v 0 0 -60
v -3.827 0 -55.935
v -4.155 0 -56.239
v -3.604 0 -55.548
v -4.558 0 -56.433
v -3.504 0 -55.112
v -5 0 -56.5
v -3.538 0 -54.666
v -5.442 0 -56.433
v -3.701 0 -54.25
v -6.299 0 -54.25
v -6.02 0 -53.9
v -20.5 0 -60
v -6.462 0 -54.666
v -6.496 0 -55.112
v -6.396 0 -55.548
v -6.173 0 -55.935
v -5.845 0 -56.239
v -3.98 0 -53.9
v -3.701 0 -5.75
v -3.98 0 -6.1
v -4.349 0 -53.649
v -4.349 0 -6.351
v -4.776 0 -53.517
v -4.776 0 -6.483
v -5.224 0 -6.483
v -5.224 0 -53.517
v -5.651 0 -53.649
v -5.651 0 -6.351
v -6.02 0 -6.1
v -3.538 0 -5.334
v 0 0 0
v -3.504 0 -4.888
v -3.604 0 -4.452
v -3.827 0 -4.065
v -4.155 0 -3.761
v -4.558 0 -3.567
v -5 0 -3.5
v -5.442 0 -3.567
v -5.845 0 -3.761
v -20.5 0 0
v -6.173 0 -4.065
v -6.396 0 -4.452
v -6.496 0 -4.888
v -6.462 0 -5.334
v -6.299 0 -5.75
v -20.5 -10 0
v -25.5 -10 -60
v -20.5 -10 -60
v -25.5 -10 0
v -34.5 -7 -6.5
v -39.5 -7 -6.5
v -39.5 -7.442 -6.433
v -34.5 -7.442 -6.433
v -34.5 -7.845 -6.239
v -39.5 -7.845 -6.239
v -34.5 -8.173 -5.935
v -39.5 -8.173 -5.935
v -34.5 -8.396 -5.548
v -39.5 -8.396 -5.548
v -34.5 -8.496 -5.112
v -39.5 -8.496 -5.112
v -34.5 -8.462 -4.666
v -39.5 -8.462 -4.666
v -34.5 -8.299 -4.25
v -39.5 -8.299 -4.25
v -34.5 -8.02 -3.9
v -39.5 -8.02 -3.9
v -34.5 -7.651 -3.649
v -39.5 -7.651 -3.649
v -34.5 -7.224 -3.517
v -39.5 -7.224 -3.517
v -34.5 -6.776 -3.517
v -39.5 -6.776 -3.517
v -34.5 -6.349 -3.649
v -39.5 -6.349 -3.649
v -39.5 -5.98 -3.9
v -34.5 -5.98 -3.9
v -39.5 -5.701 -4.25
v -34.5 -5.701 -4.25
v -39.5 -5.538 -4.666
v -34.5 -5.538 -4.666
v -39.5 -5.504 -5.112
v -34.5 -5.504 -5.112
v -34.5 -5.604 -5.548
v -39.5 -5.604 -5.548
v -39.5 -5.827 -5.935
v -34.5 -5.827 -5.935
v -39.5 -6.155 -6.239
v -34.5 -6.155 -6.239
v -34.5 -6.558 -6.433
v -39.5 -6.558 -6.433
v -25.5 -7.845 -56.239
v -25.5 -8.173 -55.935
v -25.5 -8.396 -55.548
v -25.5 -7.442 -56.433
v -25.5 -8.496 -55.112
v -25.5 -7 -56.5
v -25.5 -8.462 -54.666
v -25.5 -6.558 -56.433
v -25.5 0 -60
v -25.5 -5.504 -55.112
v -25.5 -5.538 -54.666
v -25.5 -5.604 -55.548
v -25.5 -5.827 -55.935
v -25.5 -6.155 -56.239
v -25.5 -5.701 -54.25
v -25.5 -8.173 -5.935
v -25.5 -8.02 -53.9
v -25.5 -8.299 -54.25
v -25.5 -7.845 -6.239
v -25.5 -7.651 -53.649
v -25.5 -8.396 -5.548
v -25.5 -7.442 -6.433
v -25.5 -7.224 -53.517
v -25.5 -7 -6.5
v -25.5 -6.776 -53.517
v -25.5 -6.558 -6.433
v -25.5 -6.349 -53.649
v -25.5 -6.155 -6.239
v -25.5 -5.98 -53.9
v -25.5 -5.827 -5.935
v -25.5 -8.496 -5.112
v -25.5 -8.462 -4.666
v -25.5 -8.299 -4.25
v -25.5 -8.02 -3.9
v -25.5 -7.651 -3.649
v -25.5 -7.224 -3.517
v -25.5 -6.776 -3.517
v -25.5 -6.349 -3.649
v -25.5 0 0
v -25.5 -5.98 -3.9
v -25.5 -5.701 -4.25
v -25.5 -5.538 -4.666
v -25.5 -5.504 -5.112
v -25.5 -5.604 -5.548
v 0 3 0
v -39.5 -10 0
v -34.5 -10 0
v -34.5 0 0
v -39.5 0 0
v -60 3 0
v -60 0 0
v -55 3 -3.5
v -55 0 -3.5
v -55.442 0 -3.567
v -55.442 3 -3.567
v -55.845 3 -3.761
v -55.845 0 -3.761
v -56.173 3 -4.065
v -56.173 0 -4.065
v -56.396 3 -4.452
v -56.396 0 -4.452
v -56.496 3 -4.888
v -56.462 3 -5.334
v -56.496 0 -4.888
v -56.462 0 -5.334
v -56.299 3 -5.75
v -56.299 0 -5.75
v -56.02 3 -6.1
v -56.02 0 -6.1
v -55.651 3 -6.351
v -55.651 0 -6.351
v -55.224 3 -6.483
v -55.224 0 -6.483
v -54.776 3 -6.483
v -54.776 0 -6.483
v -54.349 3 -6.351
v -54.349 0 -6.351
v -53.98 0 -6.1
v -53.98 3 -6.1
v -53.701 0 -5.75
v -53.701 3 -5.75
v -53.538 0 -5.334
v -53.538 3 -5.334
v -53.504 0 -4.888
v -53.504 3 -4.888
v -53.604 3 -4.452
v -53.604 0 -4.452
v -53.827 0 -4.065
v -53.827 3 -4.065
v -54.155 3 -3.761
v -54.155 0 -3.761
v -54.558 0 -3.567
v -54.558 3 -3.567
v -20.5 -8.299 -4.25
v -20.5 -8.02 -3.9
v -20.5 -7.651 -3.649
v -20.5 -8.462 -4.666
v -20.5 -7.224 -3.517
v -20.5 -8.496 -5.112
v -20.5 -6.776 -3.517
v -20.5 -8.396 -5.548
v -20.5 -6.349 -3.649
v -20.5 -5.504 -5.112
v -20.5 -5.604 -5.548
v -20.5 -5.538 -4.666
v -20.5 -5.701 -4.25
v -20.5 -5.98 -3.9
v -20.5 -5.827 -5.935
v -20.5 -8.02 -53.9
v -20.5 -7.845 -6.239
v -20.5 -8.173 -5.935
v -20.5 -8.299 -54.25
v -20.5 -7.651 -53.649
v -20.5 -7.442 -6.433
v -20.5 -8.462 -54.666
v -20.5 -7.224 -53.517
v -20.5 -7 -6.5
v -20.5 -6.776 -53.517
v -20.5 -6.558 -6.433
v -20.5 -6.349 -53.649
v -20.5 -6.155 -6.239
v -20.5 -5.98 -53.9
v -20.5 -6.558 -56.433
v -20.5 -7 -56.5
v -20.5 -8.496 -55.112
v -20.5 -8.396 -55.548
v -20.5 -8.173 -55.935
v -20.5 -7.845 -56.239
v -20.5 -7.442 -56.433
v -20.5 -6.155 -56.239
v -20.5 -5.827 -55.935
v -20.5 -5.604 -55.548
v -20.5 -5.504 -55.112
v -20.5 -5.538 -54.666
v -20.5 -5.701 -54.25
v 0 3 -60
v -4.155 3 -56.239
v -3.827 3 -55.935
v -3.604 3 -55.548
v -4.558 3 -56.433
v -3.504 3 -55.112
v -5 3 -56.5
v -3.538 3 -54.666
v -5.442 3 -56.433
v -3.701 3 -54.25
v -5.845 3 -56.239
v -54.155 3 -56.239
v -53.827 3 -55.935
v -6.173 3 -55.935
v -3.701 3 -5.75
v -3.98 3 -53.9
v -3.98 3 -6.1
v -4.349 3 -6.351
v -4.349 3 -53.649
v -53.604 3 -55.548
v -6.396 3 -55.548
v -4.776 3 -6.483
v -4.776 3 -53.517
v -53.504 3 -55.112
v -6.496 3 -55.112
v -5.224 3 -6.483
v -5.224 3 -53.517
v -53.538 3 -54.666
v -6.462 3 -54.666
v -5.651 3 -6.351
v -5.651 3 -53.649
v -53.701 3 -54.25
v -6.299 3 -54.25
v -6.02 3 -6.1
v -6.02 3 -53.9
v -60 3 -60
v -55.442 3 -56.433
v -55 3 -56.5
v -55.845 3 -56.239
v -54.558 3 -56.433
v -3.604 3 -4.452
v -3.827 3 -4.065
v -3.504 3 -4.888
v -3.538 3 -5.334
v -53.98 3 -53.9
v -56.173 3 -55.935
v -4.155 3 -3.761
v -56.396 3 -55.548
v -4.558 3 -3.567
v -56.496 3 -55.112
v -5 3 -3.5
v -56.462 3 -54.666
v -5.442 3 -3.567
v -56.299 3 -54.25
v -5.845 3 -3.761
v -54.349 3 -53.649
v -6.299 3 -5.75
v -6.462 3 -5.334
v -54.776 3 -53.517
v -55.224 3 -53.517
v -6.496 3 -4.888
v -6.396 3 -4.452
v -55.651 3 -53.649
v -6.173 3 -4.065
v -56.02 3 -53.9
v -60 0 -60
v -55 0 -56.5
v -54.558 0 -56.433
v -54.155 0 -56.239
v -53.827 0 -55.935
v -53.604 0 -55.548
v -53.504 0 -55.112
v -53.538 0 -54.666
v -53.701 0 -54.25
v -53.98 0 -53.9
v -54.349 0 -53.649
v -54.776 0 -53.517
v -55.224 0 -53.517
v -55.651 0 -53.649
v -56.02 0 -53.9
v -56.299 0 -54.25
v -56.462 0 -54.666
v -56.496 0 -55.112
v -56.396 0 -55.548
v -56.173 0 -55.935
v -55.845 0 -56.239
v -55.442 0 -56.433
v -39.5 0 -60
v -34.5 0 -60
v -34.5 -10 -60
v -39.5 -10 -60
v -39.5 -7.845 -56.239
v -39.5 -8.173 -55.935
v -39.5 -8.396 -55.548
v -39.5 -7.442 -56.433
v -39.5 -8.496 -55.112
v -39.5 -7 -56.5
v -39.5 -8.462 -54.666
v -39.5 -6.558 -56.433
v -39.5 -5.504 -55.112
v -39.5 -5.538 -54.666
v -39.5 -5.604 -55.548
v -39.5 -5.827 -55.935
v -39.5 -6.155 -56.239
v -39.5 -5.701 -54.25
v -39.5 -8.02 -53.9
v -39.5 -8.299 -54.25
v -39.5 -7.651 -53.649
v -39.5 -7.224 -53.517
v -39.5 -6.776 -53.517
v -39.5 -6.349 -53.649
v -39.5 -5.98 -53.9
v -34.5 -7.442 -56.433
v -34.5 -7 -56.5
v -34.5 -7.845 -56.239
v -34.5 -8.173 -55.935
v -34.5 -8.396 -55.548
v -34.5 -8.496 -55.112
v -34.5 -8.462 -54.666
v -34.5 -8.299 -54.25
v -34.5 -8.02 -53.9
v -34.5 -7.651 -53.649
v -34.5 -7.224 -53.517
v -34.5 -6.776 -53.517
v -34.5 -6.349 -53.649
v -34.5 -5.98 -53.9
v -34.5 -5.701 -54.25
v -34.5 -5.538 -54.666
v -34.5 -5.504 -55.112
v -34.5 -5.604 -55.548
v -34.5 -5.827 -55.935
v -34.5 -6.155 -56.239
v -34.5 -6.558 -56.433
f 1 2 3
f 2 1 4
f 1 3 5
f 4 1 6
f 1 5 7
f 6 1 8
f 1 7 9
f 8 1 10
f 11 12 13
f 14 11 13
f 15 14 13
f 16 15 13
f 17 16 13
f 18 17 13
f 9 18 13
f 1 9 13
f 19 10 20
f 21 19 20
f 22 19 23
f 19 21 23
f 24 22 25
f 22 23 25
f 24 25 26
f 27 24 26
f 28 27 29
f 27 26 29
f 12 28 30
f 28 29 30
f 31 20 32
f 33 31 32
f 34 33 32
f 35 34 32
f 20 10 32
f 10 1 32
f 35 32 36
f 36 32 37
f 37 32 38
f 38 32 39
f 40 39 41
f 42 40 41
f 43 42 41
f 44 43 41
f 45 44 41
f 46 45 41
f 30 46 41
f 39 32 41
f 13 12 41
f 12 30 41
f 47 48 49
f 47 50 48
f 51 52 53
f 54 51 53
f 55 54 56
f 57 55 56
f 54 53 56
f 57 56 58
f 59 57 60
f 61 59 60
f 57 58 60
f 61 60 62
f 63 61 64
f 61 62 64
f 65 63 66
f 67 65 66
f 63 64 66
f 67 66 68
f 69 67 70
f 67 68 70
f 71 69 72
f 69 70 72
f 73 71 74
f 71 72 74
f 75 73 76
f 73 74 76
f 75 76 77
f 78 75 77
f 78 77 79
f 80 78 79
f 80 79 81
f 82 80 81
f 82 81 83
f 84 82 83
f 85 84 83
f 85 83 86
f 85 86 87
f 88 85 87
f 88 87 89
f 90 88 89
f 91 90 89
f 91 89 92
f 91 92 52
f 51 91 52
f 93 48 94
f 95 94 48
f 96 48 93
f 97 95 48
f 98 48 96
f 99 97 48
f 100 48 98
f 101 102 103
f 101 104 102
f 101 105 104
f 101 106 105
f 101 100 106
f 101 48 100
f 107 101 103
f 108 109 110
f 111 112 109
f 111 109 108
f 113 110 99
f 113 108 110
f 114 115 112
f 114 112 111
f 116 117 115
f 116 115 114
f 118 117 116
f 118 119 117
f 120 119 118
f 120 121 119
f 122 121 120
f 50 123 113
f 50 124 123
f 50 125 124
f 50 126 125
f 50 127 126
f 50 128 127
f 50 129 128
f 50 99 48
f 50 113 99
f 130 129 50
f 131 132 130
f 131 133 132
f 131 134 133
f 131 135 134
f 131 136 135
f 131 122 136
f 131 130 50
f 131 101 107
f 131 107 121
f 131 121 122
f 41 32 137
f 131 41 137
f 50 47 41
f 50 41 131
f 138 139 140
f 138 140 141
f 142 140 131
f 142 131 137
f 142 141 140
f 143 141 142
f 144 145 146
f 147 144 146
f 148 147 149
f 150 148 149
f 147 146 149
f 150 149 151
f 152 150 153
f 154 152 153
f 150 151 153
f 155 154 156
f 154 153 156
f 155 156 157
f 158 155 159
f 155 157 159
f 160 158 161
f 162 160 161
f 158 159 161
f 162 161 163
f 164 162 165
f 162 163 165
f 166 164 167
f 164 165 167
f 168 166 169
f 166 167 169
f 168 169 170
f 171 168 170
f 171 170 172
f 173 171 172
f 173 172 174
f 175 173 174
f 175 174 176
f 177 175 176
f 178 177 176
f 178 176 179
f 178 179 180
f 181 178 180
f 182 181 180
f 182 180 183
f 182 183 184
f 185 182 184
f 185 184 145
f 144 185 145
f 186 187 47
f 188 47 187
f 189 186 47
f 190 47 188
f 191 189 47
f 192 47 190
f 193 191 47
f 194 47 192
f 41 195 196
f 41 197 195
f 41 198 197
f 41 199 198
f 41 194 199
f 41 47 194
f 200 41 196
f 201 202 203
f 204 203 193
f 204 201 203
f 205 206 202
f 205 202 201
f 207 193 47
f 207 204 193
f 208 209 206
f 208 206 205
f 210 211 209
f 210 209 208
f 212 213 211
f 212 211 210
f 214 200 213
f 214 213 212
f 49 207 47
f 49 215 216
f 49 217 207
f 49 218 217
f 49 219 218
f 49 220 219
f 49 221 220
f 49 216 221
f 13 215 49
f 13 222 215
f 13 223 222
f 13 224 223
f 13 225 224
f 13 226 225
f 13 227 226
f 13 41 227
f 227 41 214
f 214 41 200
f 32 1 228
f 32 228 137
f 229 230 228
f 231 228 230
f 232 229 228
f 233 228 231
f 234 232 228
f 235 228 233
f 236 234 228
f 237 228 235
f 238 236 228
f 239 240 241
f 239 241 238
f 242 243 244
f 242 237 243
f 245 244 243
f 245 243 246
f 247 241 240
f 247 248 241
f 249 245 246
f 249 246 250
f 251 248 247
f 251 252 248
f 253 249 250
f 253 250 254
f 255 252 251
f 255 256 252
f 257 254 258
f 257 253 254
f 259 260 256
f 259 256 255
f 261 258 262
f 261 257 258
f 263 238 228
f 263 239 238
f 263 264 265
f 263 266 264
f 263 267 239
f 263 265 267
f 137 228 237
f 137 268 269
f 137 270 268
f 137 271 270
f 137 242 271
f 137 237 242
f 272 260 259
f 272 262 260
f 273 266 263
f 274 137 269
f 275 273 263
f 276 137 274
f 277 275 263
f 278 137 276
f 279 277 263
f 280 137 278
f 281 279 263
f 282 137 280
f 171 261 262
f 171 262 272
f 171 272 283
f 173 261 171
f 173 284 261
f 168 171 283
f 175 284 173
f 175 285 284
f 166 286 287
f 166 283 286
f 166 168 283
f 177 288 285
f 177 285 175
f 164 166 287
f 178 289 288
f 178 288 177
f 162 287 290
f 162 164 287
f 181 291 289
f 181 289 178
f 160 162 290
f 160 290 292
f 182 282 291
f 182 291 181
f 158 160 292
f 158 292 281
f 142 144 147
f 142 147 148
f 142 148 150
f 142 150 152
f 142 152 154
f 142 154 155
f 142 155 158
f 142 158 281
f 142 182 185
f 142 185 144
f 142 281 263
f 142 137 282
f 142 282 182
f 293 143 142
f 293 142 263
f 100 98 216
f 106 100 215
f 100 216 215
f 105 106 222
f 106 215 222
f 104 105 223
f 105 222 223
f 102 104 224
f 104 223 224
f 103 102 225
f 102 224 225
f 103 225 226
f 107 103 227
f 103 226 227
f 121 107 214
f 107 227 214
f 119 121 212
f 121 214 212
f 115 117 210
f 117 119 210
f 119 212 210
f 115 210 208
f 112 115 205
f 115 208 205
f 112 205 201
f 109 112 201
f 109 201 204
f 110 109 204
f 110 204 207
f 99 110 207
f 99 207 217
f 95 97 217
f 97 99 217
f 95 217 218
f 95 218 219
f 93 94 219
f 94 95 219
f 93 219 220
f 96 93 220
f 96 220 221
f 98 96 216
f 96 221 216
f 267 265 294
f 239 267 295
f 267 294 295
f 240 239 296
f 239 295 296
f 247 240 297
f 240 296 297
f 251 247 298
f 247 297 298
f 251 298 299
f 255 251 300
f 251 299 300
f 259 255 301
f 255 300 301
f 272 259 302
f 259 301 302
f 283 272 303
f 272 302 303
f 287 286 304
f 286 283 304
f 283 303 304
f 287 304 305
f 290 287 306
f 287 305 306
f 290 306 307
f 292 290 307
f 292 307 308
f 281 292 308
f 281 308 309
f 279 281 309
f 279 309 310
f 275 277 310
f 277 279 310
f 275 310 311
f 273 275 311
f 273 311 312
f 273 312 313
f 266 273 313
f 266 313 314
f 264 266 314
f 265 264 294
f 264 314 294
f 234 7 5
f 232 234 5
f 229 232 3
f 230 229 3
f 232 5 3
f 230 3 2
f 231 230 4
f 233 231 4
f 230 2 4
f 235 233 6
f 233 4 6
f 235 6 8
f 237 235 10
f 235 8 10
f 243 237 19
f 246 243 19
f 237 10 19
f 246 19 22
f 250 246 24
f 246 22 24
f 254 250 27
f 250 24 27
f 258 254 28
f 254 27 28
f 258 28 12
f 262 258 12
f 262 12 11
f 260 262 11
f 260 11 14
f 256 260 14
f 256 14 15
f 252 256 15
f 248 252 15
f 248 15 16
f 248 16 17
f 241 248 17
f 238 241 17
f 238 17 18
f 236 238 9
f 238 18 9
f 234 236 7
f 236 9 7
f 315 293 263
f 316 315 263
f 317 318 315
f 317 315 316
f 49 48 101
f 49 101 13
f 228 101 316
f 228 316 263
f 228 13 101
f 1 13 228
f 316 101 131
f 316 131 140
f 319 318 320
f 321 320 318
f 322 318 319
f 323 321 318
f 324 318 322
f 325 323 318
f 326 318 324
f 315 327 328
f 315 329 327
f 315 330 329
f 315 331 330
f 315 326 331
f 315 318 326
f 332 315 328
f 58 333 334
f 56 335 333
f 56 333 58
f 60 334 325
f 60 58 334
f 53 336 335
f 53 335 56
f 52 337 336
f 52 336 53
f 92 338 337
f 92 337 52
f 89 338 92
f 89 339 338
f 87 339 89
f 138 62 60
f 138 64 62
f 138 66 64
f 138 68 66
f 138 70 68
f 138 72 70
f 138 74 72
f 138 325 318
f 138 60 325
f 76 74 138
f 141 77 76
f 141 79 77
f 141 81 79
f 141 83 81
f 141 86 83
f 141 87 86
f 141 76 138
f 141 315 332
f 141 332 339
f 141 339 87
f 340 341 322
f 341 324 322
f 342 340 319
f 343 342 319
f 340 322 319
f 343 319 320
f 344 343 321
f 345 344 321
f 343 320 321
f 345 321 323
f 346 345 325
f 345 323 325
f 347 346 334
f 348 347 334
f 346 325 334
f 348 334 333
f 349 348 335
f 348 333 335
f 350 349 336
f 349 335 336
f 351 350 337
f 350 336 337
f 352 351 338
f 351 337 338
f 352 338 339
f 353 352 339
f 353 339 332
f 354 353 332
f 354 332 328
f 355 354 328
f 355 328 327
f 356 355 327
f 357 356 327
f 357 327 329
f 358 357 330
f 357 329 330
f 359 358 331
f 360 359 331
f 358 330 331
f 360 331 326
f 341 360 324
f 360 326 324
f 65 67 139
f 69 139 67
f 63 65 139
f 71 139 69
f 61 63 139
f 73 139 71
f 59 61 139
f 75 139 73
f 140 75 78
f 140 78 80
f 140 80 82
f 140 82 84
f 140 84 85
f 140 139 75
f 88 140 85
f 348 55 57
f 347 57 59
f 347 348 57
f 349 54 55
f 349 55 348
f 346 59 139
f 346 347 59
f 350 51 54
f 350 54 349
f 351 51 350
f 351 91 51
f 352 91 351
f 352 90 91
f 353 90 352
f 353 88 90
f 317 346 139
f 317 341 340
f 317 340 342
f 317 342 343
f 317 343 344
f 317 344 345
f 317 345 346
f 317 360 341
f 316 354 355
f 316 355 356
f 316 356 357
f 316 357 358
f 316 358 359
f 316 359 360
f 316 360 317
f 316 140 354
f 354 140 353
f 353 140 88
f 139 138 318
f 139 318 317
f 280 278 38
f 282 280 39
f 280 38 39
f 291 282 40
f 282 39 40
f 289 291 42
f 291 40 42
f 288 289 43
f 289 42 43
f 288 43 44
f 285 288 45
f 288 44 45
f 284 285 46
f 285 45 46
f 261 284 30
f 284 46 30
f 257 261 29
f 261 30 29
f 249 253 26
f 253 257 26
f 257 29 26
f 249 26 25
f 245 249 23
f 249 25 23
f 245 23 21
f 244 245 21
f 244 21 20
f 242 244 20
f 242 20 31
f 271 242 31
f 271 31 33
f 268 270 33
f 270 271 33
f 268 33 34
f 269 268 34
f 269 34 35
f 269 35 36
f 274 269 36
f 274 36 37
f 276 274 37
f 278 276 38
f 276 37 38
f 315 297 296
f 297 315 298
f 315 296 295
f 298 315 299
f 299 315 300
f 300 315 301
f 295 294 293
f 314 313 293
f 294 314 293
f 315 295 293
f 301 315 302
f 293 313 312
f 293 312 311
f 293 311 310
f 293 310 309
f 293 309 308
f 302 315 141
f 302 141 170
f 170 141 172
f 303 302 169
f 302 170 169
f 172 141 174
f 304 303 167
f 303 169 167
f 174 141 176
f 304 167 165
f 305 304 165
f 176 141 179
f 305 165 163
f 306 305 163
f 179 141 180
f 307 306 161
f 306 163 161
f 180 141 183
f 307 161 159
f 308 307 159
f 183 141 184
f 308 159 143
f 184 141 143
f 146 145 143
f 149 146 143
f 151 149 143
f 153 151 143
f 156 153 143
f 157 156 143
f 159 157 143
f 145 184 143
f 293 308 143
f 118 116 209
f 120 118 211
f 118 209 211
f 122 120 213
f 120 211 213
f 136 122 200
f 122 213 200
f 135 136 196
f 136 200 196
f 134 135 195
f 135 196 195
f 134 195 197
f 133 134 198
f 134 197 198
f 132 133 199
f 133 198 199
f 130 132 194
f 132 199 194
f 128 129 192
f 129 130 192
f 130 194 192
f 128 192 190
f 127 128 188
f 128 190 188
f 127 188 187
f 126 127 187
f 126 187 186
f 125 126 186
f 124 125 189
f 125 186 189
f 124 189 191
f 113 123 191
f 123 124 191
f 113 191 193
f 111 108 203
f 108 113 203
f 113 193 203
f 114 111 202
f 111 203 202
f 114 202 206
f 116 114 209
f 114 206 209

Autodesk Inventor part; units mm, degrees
ref_plane "YZ Plane" through (0, 0, 0) normal (1, 0, 0) x (0, 1, 0)
ref_plane "XZ Plane" through (0, 0, 0) normal (0, 1, 0) x (-1, 0, 0)
ref_plane "XY Plane" through (0, 0, 0) normal (0, 0, 1) x (1, 0, 0)
sketch "Sketch1" plane through (0, 0, 0) normal (0, 1, 0) x (-1, 0, 0)
  line L0 (0, 0) -> (60, 0)
  line L1 (60, 0) -> (60, -60)
  line L2 (60, -60) -> (0, -60)
  line L3 (0, -60) -> (0, 0)
  dimension "d0" = 60
  dimension "d1" = 60
extrude "Extrusion1" add sketch "Sketch1" along normal blind 3
sketch "Sketch2" plane through (0, 3, 0) normal (0, 1, 0) x (1, 0, 0)
  line L0 (-60, 0) -> (0, 0) projected
  line L1 (-60, 60) -> (-60, 0) projected
  point P0 (-55, 5)
  dimension "d4" = 5
  dimension "d5" = 5
hole "Hole1" at (-55, 3, -5) direction (0, -1, 0) diameter 3 end through all
ref_plane "Work Plane1" through (-30, 0, -60) normal (-1, 0, 0) x (0, 0, 1)
ref_plane "Work Plane2" through (-60, 0, -30) normal (0, 0, 1) x (1, 0, 0)
mirror "Mirror1" about plane through (-30, 0, -60) normal (-1, 0, 0) of "Hole1"
mirror "Mirror2" about plane through (-60, 0, -30) normal (0, 0, 1) of "Hole1", "Mirror1"
sketch "Sketch3" plane through (0, 0, 0) normal (0, -1, 0) x (1, 0, 0)
  line L0 (-39.5, 0) -> (-34.5, 0)
  line L1 (-34.5, 0) -> (-34.5, -60)
  line L2 (-34.5, -60) -> (-39.5, -60)
  line L3 (-39.5, -60) -> (-39.5, 0)
  line L4 (0, -60) -> (-60, -60) projected
  line L5 (-60, 0) -> (0, 0) projected
  line L6 (-30, -72) -> (-30, 12) projected
  dimension "d13" = 5
  dimension "d14" = 4.5
extrude "Extrusion2" add sketch "Sketch3" along normal blind 10 contours L0 L1 L2 L3
sketch "Sketch4" plane through (-34.5, 0, 0) normal (1, 0, 0) x (0, 0, -1)
  line L0 (0, 0) -> (0, -10) projected
  line L1 (60, 0) -> (60, -10) projected
  line L2 (0, 0) -> (60, 0) projected
  line L3 (60, -10) -> (0, -10) projected
  point P0 (5, -7)
  point P1 (55, -7)
  dimension "d17" = 5
  dimension "d18" = 5
  dimension "d20" = 3
  dimension "d21" = 3
hole "Hole2" at (-34.5, -7, -5) at (-34.5, -7, -55) direction (-1, 0, 0) diameter 3 end through all
mirror "Mirror3" about plane through (-30, 0, -60) normal (-1, 0, 0) of "Extrusion2", "Hole2"
equation "\"d4\" = d5"
equation "\"d18\" = d17"
properties part number "Slege_Mounting_Plate"
